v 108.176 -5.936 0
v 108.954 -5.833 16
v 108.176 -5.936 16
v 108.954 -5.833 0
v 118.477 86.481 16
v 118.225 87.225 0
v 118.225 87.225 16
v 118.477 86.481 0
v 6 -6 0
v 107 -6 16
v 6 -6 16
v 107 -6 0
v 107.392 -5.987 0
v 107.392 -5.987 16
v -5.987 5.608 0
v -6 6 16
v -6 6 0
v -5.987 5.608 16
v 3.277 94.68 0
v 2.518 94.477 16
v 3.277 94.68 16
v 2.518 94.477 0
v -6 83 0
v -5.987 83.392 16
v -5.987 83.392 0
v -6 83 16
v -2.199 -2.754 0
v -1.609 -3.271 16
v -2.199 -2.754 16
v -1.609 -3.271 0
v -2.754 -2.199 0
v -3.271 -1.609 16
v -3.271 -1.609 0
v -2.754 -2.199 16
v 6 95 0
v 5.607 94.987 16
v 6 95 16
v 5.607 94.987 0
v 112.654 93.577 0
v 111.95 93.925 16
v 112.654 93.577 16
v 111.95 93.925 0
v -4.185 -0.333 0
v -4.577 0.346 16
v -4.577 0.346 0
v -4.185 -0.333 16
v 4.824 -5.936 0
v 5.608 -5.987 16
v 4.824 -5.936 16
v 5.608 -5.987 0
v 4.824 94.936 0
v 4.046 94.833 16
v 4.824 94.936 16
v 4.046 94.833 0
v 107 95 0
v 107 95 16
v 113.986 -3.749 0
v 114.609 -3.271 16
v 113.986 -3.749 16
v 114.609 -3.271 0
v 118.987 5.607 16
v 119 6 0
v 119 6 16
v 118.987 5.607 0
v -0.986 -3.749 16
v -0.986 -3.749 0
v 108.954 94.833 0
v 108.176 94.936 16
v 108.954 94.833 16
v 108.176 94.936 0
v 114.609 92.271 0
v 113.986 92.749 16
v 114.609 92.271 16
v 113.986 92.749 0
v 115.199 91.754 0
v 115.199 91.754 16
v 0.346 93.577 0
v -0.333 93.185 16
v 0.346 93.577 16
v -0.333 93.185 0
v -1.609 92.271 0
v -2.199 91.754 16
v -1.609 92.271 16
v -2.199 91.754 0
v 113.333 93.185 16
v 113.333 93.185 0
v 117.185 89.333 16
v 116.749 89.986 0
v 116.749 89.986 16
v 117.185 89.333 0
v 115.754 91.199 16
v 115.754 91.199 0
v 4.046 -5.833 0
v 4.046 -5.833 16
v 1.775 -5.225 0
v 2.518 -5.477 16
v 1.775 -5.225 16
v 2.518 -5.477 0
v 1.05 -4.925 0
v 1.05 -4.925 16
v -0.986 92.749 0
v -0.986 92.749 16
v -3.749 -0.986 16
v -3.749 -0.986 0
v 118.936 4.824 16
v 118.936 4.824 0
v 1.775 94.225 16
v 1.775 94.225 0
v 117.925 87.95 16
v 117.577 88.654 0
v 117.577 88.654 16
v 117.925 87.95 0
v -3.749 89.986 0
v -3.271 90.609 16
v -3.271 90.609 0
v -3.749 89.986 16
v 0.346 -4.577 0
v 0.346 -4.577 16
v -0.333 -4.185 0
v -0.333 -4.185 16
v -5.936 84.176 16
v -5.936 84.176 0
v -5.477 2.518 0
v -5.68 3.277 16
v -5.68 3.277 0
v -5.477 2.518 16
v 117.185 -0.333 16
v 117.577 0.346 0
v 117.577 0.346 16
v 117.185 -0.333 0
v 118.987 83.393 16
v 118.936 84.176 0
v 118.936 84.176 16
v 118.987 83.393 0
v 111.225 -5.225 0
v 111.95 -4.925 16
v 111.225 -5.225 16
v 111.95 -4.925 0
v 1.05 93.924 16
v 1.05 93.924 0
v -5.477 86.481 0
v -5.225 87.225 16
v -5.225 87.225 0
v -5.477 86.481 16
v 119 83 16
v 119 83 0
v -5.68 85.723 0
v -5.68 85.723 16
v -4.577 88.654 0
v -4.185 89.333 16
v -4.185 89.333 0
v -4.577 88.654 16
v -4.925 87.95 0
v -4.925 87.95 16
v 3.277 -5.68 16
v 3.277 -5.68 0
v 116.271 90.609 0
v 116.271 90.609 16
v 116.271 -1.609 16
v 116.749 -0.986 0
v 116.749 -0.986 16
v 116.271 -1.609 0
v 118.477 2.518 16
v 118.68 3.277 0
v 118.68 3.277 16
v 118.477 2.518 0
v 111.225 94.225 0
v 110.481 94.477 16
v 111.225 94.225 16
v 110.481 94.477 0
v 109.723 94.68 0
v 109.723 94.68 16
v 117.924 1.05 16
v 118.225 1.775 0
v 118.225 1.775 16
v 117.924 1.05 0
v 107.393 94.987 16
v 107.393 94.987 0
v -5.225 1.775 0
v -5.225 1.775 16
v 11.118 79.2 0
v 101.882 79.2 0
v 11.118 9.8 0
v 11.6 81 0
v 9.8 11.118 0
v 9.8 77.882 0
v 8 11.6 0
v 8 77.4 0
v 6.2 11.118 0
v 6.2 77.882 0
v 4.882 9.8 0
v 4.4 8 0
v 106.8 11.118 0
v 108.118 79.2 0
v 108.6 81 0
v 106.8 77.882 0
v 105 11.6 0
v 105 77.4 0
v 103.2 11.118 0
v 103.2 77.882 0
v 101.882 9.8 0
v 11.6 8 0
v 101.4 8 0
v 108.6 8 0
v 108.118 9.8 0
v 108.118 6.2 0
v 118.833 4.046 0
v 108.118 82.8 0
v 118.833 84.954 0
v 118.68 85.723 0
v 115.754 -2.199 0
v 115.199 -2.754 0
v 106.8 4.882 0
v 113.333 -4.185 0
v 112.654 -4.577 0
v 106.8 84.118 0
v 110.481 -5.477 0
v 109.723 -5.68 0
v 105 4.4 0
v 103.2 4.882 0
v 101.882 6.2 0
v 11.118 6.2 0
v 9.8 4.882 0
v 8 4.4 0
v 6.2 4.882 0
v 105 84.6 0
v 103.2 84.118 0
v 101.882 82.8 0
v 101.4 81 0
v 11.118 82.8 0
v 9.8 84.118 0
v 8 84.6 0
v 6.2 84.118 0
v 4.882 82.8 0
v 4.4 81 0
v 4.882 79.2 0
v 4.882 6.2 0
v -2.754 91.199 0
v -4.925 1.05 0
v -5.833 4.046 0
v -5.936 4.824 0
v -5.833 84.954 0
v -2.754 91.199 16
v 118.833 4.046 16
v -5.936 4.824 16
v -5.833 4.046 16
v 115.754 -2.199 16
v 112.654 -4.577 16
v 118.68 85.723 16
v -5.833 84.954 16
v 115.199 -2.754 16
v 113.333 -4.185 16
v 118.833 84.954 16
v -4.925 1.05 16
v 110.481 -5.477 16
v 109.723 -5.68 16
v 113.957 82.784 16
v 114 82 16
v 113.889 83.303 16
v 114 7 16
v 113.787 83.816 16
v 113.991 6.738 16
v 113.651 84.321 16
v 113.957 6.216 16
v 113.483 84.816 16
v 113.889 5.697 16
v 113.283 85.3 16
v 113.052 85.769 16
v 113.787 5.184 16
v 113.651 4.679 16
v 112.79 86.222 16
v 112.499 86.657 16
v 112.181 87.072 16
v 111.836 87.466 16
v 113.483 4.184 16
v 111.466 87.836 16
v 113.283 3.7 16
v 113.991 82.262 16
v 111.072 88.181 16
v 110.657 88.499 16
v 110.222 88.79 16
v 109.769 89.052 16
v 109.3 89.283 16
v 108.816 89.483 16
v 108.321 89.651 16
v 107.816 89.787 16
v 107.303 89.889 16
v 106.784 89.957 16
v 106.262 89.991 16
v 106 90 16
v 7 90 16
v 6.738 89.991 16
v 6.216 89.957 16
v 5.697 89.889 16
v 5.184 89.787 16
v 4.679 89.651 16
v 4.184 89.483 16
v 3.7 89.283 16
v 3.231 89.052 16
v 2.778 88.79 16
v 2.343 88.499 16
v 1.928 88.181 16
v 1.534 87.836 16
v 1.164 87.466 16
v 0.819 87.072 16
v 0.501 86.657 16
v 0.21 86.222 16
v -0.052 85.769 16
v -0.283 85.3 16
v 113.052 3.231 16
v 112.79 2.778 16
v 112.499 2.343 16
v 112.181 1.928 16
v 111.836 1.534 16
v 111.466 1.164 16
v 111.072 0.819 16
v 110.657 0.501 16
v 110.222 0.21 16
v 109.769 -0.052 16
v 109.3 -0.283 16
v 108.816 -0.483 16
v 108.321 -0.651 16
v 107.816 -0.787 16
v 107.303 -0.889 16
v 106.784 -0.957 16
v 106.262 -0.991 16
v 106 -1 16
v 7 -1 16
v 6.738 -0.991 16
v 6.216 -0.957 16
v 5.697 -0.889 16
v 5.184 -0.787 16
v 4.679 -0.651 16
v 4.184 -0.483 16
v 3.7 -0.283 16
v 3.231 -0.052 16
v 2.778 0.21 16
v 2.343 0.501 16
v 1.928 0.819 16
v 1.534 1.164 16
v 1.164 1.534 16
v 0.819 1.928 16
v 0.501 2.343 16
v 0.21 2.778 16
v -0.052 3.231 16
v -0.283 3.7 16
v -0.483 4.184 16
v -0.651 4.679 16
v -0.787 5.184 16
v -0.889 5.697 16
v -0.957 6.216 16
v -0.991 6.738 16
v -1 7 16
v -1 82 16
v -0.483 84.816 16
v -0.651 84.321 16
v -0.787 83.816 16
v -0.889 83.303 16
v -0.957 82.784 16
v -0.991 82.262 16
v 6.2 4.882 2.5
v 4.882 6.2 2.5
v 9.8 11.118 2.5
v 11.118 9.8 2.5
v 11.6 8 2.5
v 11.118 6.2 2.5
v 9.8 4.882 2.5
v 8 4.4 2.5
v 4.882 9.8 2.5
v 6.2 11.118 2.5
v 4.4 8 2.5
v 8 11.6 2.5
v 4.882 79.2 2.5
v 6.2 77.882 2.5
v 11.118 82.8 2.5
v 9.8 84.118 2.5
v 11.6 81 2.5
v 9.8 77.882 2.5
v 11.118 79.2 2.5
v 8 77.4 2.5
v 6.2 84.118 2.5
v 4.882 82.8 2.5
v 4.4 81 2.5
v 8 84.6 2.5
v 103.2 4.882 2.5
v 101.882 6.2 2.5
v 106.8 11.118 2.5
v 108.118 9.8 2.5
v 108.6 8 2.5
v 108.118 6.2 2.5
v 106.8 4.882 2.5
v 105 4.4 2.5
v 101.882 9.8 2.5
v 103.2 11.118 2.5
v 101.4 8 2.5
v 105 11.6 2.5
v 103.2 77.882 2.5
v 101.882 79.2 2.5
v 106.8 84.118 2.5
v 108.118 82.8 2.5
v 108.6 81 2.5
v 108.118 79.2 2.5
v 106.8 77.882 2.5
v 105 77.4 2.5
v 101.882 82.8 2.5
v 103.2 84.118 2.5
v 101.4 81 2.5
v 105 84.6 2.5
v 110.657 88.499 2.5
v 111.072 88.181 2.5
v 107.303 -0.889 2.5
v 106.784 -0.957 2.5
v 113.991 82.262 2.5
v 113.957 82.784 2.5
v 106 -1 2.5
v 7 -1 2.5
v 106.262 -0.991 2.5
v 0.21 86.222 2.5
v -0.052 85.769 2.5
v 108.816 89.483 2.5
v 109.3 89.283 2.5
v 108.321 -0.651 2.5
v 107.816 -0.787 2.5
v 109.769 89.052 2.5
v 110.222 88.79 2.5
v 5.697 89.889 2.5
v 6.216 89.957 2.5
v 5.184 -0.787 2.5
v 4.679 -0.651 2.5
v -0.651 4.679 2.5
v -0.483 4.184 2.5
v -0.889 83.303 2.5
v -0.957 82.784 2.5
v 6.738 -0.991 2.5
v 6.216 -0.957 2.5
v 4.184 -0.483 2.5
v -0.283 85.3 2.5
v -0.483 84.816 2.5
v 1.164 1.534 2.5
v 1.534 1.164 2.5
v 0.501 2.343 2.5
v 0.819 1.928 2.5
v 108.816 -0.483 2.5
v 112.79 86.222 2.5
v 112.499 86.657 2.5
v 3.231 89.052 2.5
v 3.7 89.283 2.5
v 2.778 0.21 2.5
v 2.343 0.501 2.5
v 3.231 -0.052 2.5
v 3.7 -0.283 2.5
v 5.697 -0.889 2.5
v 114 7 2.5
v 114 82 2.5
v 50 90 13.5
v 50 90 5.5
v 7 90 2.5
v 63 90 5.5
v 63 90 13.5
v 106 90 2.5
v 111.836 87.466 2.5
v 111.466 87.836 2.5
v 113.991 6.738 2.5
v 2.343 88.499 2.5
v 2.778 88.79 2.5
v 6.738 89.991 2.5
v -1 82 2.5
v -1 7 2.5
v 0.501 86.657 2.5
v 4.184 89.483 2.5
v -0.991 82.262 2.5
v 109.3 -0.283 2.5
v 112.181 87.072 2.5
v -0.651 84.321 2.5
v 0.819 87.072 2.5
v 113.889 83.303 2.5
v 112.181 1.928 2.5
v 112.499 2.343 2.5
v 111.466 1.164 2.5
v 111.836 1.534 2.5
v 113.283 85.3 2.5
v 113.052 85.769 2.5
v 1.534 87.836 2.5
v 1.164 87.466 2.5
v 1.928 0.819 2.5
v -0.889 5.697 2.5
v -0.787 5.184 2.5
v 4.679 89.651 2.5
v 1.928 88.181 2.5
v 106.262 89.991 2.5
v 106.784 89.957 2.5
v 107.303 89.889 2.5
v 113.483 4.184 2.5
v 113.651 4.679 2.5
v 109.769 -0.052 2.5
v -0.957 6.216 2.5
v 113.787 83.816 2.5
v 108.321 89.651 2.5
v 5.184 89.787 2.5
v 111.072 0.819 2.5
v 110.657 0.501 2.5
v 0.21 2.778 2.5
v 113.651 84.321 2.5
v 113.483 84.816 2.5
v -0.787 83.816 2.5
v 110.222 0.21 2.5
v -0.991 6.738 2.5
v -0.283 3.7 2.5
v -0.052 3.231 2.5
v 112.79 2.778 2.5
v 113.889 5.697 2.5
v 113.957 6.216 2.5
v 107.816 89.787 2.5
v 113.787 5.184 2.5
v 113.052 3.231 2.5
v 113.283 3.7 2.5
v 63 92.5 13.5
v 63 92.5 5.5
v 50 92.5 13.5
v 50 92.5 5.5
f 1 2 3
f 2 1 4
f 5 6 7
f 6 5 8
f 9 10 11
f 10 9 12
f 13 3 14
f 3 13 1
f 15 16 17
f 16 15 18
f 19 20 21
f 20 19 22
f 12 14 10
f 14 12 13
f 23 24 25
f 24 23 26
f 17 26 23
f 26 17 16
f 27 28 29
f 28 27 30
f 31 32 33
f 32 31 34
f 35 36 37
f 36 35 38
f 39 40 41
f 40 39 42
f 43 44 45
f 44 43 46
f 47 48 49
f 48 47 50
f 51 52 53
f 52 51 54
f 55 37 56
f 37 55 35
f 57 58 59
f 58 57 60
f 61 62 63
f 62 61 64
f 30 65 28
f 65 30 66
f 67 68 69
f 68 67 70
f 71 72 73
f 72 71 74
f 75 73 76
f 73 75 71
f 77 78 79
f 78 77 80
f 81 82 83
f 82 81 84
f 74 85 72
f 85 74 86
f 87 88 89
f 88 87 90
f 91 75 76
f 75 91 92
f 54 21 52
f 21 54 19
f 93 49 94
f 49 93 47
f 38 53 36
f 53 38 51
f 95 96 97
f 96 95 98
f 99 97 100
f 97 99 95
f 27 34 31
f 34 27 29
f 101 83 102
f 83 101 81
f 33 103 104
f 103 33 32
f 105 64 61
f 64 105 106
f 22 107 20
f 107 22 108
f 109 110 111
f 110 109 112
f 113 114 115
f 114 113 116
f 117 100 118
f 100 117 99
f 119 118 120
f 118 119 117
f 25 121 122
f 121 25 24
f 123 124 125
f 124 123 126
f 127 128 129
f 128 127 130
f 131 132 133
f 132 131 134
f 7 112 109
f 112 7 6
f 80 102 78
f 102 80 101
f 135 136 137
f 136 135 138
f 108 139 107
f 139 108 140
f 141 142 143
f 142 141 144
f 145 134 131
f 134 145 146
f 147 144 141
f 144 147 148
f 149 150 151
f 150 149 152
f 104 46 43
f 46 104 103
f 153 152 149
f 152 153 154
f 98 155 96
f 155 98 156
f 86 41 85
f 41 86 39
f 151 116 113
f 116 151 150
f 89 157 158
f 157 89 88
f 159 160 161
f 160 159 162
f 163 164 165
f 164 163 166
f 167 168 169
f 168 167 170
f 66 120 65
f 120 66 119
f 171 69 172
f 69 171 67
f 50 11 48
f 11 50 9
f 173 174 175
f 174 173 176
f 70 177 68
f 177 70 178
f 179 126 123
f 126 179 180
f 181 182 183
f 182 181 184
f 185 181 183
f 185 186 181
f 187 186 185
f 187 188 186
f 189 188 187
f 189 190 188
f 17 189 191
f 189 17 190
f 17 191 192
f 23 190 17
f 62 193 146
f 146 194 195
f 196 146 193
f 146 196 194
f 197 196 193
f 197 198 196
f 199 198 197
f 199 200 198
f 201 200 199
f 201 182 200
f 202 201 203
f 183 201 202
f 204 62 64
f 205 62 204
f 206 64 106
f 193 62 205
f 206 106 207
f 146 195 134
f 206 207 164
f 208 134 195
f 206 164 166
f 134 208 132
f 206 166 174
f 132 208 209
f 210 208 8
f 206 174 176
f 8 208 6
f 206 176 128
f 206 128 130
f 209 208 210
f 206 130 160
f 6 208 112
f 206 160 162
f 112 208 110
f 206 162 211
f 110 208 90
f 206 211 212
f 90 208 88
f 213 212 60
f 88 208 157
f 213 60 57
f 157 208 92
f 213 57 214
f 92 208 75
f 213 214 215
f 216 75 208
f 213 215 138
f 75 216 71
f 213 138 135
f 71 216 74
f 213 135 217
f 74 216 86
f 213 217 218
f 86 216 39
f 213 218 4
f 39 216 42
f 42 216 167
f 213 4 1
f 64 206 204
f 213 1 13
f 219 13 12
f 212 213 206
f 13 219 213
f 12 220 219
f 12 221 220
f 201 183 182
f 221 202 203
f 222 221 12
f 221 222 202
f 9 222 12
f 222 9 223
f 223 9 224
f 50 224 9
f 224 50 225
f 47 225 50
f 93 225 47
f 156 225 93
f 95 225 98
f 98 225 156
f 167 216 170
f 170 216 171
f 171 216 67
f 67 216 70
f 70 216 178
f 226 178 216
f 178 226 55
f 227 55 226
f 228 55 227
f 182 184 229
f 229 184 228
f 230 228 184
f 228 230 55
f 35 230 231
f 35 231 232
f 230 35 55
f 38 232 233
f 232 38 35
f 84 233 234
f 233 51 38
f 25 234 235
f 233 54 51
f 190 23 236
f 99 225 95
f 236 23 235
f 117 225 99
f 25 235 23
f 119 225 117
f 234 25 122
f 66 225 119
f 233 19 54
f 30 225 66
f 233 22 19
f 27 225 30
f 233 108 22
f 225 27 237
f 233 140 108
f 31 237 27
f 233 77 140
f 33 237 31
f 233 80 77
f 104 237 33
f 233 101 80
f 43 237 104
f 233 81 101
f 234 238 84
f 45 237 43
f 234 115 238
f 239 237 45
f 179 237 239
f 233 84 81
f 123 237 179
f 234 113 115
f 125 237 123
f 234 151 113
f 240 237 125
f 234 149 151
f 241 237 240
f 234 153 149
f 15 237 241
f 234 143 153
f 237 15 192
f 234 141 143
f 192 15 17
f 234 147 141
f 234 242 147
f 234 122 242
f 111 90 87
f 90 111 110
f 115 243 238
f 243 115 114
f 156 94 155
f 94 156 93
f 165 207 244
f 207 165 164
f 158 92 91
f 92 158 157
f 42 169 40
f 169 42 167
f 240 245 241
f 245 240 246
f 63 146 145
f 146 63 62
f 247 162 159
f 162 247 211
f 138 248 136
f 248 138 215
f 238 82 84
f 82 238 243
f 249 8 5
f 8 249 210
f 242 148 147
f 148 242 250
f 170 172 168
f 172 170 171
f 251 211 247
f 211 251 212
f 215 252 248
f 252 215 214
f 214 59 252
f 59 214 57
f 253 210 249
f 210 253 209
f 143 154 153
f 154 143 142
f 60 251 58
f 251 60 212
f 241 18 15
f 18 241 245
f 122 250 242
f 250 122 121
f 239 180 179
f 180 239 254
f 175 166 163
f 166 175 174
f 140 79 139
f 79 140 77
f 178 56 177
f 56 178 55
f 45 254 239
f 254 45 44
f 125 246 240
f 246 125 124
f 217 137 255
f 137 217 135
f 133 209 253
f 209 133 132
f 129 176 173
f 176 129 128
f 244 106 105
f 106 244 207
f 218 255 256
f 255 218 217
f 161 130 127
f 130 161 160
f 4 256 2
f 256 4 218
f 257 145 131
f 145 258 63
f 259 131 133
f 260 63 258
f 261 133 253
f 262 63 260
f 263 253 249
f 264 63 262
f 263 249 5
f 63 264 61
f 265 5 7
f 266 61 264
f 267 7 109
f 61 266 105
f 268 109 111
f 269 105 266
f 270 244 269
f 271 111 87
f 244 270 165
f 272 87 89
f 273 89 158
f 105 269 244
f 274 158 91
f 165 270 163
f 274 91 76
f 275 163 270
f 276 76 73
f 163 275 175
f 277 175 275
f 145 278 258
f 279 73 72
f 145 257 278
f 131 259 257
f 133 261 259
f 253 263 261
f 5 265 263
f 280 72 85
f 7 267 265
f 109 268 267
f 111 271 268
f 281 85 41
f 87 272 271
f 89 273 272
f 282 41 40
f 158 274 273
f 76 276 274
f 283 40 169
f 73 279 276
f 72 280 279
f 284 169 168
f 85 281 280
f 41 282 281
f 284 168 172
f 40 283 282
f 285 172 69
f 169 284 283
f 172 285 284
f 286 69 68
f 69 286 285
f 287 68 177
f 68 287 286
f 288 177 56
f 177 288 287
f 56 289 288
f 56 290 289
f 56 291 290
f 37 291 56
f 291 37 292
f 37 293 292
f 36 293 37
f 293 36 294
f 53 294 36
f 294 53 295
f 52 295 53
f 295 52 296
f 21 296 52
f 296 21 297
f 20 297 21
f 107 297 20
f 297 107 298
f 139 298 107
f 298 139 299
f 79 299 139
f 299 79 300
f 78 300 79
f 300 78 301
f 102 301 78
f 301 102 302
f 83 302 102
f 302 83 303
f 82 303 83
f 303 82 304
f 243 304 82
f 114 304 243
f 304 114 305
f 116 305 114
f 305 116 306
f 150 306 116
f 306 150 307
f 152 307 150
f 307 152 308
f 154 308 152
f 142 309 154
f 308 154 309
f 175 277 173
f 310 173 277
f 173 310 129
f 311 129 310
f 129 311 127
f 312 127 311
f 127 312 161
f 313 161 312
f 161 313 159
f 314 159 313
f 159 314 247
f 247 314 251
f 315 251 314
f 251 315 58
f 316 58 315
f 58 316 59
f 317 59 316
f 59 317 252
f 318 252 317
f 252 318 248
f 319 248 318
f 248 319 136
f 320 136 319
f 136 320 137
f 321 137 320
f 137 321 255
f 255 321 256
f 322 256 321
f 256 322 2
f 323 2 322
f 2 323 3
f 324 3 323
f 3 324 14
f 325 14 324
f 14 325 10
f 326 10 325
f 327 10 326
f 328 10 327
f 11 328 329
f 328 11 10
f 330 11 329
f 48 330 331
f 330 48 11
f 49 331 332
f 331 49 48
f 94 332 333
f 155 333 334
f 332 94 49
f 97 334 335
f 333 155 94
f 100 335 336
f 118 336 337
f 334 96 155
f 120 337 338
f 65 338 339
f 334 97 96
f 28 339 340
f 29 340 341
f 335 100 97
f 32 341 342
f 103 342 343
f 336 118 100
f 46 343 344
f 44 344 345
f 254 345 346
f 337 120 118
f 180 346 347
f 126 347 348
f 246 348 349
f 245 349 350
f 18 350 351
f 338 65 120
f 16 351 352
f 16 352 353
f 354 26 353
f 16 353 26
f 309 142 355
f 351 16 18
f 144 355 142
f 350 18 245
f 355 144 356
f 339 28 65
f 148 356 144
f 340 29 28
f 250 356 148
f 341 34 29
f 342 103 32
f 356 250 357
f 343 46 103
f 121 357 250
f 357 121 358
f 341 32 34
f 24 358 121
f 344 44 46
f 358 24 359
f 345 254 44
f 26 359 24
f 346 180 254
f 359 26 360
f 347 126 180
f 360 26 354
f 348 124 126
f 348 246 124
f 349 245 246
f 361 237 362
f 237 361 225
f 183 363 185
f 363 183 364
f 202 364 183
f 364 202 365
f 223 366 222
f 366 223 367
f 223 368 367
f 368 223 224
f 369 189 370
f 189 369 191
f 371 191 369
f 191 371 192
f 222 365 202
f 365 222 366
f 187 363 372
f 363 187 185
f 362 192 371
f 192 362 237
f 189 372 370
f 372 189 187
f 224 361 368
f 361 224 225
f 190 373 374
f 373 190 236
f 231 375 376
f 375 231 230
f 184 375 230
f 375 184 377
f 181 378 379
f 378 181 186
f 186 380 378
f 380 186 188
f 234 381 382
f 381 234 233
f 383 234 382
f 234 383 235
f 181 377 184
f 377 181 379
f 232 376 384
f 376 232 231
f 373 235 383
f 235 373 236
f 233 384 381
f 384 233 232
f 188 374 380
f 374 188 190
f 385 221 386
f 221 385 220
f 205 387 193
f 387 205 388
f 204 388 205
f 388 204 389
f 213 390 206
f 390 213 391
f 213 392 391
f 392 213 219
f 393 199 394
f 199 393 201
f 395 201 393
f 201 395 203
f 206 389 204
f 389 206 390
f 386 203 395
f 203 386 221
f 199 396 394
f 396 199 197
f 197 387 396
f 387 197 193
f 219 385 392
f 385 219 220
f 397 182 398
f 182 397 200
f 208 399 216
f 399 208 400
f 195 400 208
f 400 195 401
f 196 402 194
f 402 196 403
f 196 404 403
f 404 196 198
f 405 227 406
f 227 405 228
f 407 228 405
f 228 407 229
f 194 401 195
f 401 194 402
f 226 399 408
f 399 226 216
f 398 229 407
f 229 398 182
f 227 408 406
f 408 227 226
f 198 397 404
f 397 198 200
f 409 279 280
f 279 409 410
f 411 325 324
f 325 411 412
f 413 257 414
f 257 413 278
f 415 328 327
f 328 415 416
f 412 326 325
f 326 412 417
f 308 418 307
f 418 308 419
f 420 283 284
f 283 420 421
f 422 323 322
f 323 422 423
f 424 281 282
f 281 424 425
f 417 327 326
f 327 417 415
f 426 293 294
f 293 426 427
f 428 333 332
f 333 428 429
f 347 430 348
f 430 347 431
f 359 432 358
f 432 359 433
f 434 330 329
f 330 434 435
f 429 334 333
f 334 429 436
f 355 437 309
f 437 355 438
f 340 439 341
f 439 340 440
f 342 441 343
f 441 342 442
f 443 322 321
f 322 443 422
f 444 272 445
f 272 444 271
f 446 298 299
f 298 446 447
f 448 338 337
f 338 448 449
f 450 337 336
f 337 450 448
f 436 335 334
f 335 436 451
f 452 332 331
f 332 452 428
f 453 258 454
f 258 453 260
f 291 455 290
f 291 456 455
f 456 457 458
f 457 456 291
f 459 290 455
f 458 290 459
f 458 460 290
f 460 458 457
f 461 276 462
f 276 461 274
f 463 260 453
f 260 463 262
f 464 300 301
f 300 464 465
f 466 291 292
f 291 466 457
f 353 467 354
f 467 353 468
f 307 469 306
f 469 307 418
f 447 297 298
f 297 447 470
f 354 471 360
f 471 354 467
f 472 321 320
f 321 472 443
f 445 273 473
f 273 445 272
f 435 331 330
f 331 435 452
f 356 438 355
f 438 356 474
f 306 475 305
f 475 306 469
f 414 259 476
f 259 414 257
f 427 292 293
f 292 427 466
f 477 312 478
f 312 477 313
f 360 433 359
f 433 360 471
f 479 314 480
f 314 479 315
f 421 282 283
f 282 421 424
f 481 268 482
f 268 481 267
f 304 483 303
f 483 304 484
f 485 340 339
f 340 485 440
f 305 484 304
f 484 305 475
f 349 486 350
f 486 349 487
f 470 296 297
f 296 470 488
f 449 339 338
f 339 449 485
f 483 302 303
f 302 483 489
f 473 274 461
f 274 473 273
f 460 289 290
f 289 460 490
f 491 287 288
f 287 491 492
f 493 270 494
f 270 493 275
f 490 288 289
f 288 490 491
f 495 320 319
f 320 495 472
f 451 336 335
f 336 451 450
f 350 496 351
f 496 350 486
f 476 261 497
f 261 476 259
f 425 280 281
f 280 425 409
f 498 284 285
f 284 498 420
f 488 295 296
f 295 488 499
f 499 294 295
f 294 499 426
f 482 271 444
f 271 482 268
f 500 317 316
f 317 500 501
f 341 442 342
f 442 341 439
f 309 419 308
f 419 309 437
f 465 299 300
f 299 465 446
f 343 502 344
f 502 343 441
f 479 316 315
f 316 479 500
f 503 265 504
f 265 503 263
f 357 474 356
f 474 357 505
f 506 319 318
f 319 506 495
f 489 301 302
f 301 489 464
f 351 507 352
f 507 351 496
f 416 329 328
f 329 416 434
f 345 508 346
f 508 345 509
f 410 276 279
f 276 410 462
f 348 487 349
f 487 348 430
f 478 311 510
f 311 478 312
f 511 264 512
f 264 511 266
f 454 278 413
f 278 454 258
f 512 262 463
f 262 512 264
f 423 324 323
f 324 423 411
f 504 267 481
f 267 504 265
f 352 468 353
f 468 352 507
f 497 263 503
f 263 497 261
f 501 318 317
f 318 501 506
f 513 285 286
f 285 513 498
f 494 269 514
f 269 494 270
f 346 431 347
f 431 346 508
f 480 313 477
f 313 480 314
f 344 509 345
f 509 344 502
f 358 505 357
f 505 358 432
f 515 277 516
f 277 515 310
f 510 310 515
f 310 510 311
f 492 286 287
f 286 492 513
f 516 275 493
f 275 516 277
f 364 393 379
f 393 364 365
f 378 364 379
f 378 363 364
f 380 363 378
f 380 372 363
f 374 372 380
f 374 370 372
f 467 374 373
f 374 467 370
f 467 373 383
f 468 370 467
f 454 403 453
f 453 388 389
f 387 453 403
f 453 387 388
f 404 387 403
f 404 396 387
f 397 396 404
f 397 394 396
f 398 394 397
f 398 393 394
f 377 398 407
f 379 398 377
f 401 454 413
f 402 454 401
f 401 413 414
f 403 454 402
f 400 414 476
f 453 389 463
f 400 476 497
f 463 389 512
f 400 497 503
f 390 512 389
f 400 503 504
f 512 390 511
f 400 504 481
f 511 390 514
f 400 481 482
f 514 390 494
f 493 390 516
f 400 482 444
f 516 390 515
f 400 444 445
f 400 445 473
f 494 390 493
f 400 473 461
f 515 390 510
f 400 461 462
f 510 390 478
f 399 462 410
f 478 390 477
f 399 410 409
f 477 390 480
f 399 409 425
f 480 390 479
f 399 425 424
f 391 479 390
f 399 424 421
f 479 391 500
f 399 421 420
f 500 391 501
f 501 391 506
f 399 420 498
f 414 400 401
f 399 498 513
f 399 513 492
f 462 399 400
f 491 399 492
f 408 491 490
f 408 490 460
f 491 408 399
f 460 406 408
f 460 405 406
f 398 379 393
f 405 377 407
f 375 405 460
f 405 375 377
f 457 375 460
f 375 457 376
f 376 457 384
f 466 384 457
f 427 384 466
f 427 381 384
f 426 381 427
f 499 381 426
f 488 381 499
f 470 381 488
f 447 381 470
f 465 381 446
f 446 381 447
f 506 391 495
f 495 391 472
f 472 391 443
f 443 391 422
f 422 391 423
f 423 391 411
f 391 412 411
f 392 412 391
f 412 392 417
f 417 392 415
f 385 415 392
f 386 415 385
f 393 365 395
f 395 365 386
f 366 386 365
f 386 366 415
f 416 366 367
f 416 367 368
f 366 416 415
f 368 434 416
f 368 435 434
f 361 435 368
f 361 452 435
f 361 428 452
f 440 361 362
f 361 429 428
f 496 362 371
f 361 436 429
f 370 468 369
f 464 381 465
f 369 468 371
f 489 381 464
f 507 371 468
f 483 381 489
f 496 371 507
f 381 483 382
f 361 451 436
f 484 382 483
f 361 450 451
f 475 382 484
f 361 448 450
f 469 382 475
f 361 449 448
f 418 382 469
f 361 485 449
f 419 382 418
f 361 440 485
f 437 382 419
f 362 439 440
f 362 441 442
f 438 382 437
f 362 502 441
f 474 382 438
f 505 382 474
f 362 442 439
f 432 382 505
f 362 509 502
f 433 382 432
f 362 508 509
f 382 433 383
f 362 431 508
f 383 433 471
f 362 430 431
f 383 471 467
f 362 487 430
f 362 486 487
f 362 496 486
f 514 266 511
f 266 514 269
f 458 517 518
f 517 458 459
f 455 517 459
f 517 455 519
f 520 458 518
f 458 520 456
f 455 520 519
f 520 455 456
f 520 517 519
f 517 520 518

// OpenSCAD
deck_cols = 3;
deck_rows = 2;
spacing_x = 36;
spacing_y = 42;
oled_w    = 27;
oled_h    = 27;
glass_w   = 22;
glass_h   = 12;
btn_dia   = 12;
btn_inset = 4;

case_wall = 2.5;
case_h    = 16;
oled_ch   = 9;
btn_ch    = 4;
wall_tol  = 0.3;
screw_r   = 1.6;
screw_dx  = 8;
screw_dy  = 8;

usb_w     = 13;
usb_h     = 8;
usb_from_floor = 3;
usb_recess     = 8;

unit_cw   = spacing_x;
unit_rowA = 20;
unit_rowB = 34;
inner_w   = deck_cols * spacing_x + case_wall * 2;
inner_h   = deck_rows * spacing_y + case_wall * 2;

module rounded_square(w, h, r, $fn=48) {
    hull() {
        for (x = [r, w-r]) for (y = [r, h-r])
            translate([x, y, 0]) circle(r=r);
    }
}

module top_plate() {
    difference() {
        linear_extrude(case_wall)
            offset(r=6) rounded_square(inner_w, inner_h, 6);
        for (c=[0:deck_cols-1]) for (r=[0:deck_rows-1]) {
            let(x = case_wall + (c+0.5)*spacing_x,
                y = case_wall + r*spacing_y + unit_rowA) {
                translate([x - glass_w/2, y - glass_h/2, 0])
                    cube([glass_w, glass_h, case_wall+1]);
                translate([x - oled_w/2, y - oled_h/2, case_wall])
                    linear_extrude(oled_ch)
                        rounded_square(oled_w, oled_h, 2);
            }
        }
        for (c=[0:deck_cols-1]) for (r=[0:deck_rows-1]) {
            let(x = case_wall + (c+0.5)*spacing_x,
                y = case_wall + r*spacing_y + unit_rowB)
                translate([x, y, 0]) cylinder(d=btn_dia, h=case_wall+btn_ch+1);
        }
        for (x=[screw_dx, inner_w-screw_dx])
            for (y=[screw_dy, inner_h-screw_dy])
                translate([x, y, -1]) cylinder(d=screw_r*2, h=case_wall+3);
    }
}

module bottom_base() {
    difference() {
        union() {
            translate([0, 0, 0])
                linear_extrude(case_h - case_wall)
                    offset(r=6) rounded_square(inner_w, inner_h, 6);
            linear_extrude(case_h)
                offset(r=6) rounded_square(inner_w, inner_h, 6);
        }
        translate([case_wall+0.5, case_wall+0.5, case_wall])
            linear_extrude(case_h)
                offset(r=4) rounded_square(
                    inner_w-2*case_wall-1, inner_h-2*case_wall-1, 4);
        for (x=[screw_dx, inner_w-screw_dx])
            for (y=[screw_dy, inner_h-screw_dy])
                translate([x, y, -1]) cylinder(d=screw_r*2 + 4, h=case_h+2);
        let(ux = inner_w/2 - usb_w/2,
            uy = inner_h - usb_recess,
            uz = case_wall + usb_from_floor) {
            translate([ux, uy, uz])
                cube([usb_w, usb_recess + case_wall + 1, usb_h]);
        }
    }
}

part = 1;
if (part == 0) top_plate();
else           bottom_base();
